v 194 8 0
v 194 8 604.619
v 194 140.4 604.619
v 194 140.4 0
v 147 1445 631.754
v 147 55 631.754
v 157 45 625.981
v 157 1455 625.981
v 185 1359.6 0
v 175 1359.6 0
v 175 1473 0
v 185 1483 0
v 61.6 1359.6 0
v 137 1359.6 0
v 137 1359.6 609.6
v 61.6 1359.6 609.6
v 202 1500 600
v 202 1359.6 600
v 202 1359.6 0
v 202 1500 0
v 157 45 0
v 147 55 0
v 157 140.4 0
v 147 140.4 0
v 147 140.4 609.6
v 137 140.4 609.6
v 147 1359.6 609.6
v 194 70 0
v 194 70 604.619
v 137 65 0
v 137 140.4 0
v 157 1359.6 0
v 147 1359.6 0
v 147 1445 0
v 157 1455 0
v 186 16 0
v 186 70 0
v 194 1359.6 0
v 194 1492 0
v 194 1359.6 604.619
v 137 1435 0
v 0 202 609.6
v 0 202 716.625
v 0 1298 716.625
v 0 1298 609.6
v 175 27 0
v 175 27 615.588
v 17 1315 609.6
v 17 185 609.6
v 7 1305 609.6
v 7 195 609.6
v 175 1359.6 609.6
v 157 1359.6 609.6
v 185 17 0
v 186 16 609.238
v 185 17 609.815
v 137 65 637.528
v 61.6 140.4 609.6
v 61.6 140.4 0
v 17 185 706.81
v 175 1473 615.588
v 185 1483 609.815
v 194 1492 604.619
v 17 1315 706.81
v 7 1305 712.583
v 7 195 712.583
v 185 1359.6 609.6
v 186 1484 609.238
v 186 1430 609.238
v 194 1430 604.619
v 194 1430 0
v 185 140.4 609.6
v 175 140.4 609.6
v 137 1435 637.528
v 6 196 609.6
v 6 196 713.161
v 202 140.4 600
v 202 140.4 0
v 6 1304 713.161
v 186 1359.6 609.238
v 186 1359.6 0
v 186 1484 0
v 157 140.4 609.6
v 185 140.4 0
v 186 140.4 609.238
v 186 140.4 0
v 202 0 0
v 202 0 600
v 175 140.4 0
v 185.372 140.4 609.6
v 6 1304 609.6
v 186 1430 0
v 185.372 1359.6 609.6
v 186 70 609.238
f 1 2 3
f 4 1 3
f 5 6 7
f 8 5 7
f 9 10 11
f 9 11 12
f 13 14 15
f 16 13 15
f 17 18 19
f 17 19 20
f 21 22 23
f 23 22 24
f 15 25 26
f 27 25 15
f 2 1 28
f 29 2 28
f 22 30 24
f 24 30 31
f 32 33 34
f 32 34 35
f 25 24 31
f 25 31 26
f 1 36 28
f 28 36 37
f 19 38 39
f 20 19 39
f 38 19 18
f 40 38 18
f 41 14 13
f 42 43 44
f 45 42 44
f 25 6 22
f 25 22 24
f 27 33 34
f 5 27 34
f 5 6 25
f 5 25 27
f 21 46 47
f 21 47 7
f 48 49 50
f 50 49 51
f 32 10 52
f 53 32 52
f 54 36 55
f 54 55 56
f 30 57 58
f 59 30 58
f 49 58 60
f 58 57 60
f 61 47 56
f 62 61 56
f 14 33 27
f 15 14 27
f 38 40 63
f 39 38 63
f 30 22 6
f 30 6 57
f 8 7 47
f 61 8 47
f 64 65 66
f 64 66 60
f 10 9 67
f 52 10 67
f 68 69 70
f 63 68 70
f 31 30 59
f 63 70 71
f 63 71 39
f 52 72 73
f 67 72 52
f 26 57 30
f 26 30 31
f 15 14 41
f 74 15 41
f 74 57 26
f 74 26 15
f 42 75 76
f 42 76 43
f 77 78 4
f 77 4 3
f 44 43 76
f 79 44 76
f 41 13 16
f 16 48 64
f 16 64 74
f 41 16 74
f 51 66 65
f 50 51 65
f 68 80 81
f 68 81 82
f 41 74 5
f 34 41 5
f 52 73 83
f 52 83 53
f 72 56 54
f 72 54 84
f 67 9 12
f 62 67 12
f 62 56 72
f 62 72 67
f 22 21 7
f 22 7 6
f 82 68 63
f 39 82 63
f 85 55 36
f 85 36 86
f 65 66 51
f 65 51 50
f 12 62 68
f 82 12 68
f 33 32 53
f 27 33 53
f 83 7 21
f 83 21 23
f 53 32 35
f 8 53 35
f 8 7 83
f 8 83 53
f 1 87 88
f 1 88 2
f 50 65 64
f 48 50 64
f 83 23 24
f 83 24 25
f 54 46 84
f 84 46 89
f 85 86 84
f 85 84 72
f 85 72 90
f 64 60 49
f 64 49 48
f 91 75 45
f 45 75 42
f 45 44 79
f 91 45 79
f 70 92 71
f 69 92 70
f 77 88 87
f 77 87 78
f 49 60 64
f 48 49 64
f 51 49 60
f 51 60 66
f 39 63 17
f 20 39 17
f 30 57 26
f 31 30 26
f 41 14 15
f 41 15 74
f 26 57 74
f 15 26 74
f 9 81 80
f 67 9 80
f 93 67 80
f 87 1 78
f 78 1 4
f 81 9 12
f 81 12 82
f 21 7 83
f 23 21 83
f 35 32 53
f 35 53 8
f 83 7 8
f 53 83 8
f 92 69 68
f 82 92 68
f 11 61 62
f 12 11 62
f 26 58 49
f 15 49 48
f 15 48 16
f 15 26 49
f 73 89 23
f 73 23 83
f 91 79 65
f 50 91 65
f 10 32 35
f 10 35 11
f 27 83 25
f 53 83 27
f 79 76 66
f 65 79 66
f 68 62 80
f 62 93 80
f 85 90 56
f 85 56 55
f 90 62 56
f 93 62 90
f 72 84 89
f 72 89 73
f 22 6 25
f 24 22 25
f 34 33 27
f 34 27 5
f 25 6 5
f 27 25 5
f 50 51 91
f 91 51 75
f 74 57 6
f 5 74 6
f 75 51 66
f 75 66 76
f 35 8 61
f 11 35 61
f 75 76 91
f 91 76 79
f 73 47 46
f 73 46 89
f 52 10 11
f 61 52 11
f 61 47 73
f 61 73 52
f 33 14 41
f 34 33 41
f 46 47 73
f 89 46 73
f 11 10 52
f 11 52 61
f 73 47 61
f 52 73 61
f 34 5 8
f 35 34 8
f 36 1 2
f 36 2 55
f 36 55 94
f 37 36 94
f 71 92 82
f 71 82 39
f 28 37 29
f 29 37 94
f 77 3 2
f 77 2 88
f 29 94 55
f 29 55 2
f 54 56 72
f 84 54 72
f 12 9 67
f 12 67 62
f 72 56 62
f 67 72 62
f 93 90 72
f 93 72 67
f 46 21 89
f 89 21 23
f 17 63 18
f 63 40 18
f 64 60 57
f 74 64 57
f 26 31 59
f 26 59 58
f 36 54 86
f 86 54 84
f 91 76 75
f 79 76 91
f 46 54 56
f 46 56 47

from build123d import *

# Parameters (mm, degrees)
F0_W      = 1500
F0_H      = 800
F1_DEPTH  = 6
F2_DEPTH  = 1
F3_DEPTH  = 10
F4_DEPTH  = 120
F5_DEPTH  = 10
F6_DEPTH  = 10
F7_DEPTH  = 18
F8_DEPTH  = 10
F9_DEPTH  = 1
F10_W     = 70
F10_H     = 800
F11_DEPTH = 8
F12_W     = 1500
F12_H     = 800
F13_DEPTH = 8
F15_DEPTH = 800.001
F16_W     = 1219.2
F16_H     = 609.6
F17_DEPTH = 202.001
F19_DEPTH = 1500.001


with BuildPart() as f1:
    # F0 (on Right) → F1 (new body)
    with BuildSketch(Plane.YZ):
        with Locations((750, 400)):
            Rectangle(F0_W, F0_H)
    extrude(amount=F1_DEPTH)


with BuildPart() as f2:
    # F2 (new): a face of the model
    f2_faces = [f1.part.faces().sort_by_distance(p)[0] for p in [
        (6, 750, 400),
    ]]
    extrude(f2_faces, amount=F2_DEPTH)


with BuildPart() as f3:
    # F3 (new): a face of the model
    f3_faces = [f2.part.faces().sort_by_distance(p)[0] for p in [
        (7, 750, 400),
    ]]
    extrude(f3_faces, amount=F3_DEPTH)


with BuildPart() as f4:
    # F4 (new): a face of the model
    f4_faces = [f3.part.faces().sort_by_distance(p)[0] for p in [
        (17, 750, 400),
    ]]
    extrude(f4_faces, amount=F4_DEPTH)


with BuildPart() as f5:
    # F5 (new): a face of the model
    f5_faces = [f4.part.faces().sort_by_distance(p)[0] for p in [
        (137, 750, 400),
    ]]
    extrude(f5_faces, amount=F5_DEPTH)


with BuildPart() as f6:
    # F6 (new): a face of the model
    f6_faces = [f5.part.faces().sort_by_distance(p)[0] for p in [
        (147, 750, 400),
    ]]
    extrude(f6_faces, amount=F6_DEPTH)


with BuildPart() as f7:
    # F7 (new): a face of the model
    f7_faces = [f6.part.faces().sort_by_distance(p)[0] for p in [
        (157, 750, 400),
    ]]
    extrude(f7_faces, amount=F7_DEPTH)


with BuildPart() as f8:
    # F8 (new): a face of the model
    f8_faces = [f7.part.faces().sort_by_distance(p)[0] for p in [
        (175, 750, 400),
    ]]
    extrude(f8_faces, amount=F8_DEPTH)


with BuildPart() as f9:
    # F9 (new): a face of the model
    f9_faces = [f8.part.faces().sort_by_distance(p)[0] for p in [
        (185, 750, 400),
    ]]
    extrude(f9_faces, amount=F9_DEPTH)


with BuildPart() as f11:
    # F10 (on face) → F11 (new body)
    with BuildSketch(Plane.YZ.offset(186)):
        with Locations((35, 400)):
            Rectangle(F10_W, F10_H)
    extrude(amount=F11_DEPTH)


with BuildPart() as f11b:
    # F10 (on face) → F11, piece 2 (new body)
    with BuildSketch(Plane.YZ.offset(186)):
        with Locations((1465, 400)):
            Rectangle(F10_W, F10_H)
    extrude(amount=F11_DEPTH)


with BuildPart() as f13:
    # F12 (on face) → F13 (new body)
    with BuildSketch(Plane.YZ.offset(194)):
        with Locations((750, 400)):
            Rectangle(F12_W, F12_H)
    extrude(amount=F13_DEPTH)


with BuildPart() as f15_tool:
    # F14 (on face) → F15 (new body, through all)
    with BuildSketch(Plane.XY.offset(800)):
        Polygon((0, 1298), (202, 1500), (0, 1500), align=None)
        Polygon((202, 0), (0, 202), (0, 0), align=None)
    extrude(amount=-F15_DEPTH)


with BuildPart() as f1_1:
    add(f1.part)

    # F15: cut by f15_tool
    add(f15_tool.part, mode=Mode.SUBTRACT)


with BuildPart() as f2_1:
    add(f2.part)

    # F15: cut by f15_tool
    add(f15_tool.part, mode=Mode.SUBTRACT)


with BuildPart() as f3_1:
    add(f3.part)

    # F15: cut by f15_tool
    add(f15_tool.part, mode=Mode.SUBTRACT)


with BuildPart() as f4_1:
    add(f4.part)

    # F15: cut by f15_tool
    add(f15_tool.part, mode=Mode.SUBTRACT)


with BuildPart() as f5_1:
    add(f5.part)

    # F15: cut by f15_tool
    add(f15_tool.part, mode=Mode.SUBTRACT)


with BuildPart() as f6_1:
    add(f6.part)

    # F15: cut by f15_tool
    add(f15_tool.part, mode=Mode.SUBTRACT)


with BuildPart() as f7_1:
    add(f7.part)

    # F15: cut by f15_tool
    add(f15_tool.part, mode=Mode.SUBTRACT)


with BuildPart() as f8_1:
    add(f8.part)

    # F15: cut by f15_tool
    add(f15_tool.part, mode=Mode.SUBTRACT)


with BuildPart() as f9_1:
    add(f9.part)

    # F15: cut by f15_tool
    add(f15_tool.part, mode=Mode.SUBTRACT)


with BuildPart() as f11_1:
    add(f11.part)

    # F15: cut by f15_tool
    add(f15_tool.part, mode=Mode.SUBTRACT)


with BuildPart() as f11b_1:
    add(f11b.part)

    # F15: cut by f15_tool
    add(f15_tool.part, mode=Mode.SUBTRACT)


with BuildPart() as f13_1:
    add(f13.part)

    # F15: cut by f15_tool
    add(f15_tool.part, mode=Mode.SUBTRACT)


with BuildPart() as f17_tool:
    # F16 (on face) → F17 (new body, through all)
    with BuildSketch(Plane.YZ.offset(202)):
        with Locations((750, 304.8)):
            Rectangle(F16_W, F16_H)
    extrude(amount=-F17_DEPTH)


with BuildPart() as f1_2:
    add(f1_1.part)

    # F17: cut by f17_tool
    add(f17_tool.part, mode=Mode.SUBTRACT)


with BuildPart() as f2_2:
    add(f2_1.part)

    # F17: cut by f17_tool
    add(f17_tool.part, mode=Mode.SUBTRACT)


with BuildPart() as f3_2:
    add(f3_1.part)

    # F17: cut by f17_tool
    add(f17_tool.part, mode=Mode.SUBTRACT)


with BuildPart() as f4_2:
    add(f4_1.part)

    # F17: cut by f17_tool
    add(f17_tool.part, mode=Mode.SUBTRACT)


with BuildPart() as f5_2:
    add(f5_1.part)

    # F17: cut by f17_tool
    add(f17_tool.part, mode=Mode.SUBTRACT)


with BuildPart() as f6_2:
    add(f6_1.part)

    # F17: cut by f17_tool
    add(f17_tool.part, mode=Mode.SUBTRACT)


with BuildPart() as f7_2:
    add(f7_1.part)

    # F17: cut by f17_tool
    add(f17_tool.part, mode=Mode.SUBTRACT)


with BuildPart() as f8_2:
    add(f8_1.part)

    # F17: cut by f17_tool
    add(f17_tool.part, mode=Mode.SUBTRACT)


with BuildPart() as f9_2:
    add(f9_1.part)

    # F17: cut by f17_tool
    add(f17_tool.part, mode=Mode.SUBTRACT)


with BuildPart() as f13_2:
    add(f13_1.part)

    # F17: cut by f17_tool
    add(f17_tool.part, mode=Mode.SUBTRACT)


with BuildPart() as f19_tool:
    # F18 (on Front) → F19 (new body, through all)
    with BuildSketch(Plane.XZ):
        Polygon((202, 1100), (-664.0254037844, 1100), (202, 600), align=None)
    extrude(amount=-F19_DEPTH)


with BuildPart() as f1_3:
    add(f1_2.part)

    # F19: cut by f19_tool
    add(f19_tool.part, mode=Mode.SUBTRACT)


with BuildPart() as f2_3:
    add(f2_2.part)

    # F19: cut by f19_tool
    add(f19_tool.part, mode=Mode.SUBTRACT)


with BuildPart() as f3_3:
    add(f3_2.part)

    # F19: cut by f19_tool
    add(f19_tool.part, mode=Mode.SUBTRACT)


with BuildPart() as f4_3:
    add(f4_2.part)

    # F19: cut by f19_tool
    add(f19_tool.part, mode=Mode.SUBTRACT)


with BuildPart() as f5_3:
    add(f5_2.part)

    # F19: cut by f19_tool
    add(f19_tool.part, mode=Mode.SUBTRACT)


with BuildPart() as f6_3:
    add(f6_2.part)

    # F19: cut by f19_tool
    add(f19_tool.part, mode=Mode.SUBTRACT)


with BuildPart() as f7_3:
    add(f7_2.part)

    # F19: cut by f19_tool
    add(f19_tool.part, mode=Mode.SUBTRACT)


with BuildPart() as f8_3:
    add(f8_2.part)

    # F19: cut by f19_tool
    add(f19_tool.part, mode=Mode.SUBTRACT)


with BuildPart() as f9_3:
    add(f9_2.part)

    # F19: cut by f19_tool
    add(f19_tool.part, mode=Mode.SUBTRACT)


with BuildPart() as f11_2:
    add(f11_1.part)

    # F19: cut by f19_tool
    add(f19_tool.part, mode=Mode.SUBTRACT)


with BuildPart() as f11b_2:
    add(f11b_1.part)

    # F19: cut by f19_tool
    add(f19_tool.part, mode=Mode.SUBTRACT)


with BuildPart() as f13_3:
    add(f13_2.part)

    # F19: cut by f19_tool
    add(f19_tool.part, mode=Mode.SUBTRACT)


solid = Compound([f1_3.part, f2_3.part, f3_3.part, f4_3.part, f5_3.part, f6_3.part, f7_3.part, f8_3.part, f9_3.part, f11_2.part, f11b_2.part, f13_3.part])
